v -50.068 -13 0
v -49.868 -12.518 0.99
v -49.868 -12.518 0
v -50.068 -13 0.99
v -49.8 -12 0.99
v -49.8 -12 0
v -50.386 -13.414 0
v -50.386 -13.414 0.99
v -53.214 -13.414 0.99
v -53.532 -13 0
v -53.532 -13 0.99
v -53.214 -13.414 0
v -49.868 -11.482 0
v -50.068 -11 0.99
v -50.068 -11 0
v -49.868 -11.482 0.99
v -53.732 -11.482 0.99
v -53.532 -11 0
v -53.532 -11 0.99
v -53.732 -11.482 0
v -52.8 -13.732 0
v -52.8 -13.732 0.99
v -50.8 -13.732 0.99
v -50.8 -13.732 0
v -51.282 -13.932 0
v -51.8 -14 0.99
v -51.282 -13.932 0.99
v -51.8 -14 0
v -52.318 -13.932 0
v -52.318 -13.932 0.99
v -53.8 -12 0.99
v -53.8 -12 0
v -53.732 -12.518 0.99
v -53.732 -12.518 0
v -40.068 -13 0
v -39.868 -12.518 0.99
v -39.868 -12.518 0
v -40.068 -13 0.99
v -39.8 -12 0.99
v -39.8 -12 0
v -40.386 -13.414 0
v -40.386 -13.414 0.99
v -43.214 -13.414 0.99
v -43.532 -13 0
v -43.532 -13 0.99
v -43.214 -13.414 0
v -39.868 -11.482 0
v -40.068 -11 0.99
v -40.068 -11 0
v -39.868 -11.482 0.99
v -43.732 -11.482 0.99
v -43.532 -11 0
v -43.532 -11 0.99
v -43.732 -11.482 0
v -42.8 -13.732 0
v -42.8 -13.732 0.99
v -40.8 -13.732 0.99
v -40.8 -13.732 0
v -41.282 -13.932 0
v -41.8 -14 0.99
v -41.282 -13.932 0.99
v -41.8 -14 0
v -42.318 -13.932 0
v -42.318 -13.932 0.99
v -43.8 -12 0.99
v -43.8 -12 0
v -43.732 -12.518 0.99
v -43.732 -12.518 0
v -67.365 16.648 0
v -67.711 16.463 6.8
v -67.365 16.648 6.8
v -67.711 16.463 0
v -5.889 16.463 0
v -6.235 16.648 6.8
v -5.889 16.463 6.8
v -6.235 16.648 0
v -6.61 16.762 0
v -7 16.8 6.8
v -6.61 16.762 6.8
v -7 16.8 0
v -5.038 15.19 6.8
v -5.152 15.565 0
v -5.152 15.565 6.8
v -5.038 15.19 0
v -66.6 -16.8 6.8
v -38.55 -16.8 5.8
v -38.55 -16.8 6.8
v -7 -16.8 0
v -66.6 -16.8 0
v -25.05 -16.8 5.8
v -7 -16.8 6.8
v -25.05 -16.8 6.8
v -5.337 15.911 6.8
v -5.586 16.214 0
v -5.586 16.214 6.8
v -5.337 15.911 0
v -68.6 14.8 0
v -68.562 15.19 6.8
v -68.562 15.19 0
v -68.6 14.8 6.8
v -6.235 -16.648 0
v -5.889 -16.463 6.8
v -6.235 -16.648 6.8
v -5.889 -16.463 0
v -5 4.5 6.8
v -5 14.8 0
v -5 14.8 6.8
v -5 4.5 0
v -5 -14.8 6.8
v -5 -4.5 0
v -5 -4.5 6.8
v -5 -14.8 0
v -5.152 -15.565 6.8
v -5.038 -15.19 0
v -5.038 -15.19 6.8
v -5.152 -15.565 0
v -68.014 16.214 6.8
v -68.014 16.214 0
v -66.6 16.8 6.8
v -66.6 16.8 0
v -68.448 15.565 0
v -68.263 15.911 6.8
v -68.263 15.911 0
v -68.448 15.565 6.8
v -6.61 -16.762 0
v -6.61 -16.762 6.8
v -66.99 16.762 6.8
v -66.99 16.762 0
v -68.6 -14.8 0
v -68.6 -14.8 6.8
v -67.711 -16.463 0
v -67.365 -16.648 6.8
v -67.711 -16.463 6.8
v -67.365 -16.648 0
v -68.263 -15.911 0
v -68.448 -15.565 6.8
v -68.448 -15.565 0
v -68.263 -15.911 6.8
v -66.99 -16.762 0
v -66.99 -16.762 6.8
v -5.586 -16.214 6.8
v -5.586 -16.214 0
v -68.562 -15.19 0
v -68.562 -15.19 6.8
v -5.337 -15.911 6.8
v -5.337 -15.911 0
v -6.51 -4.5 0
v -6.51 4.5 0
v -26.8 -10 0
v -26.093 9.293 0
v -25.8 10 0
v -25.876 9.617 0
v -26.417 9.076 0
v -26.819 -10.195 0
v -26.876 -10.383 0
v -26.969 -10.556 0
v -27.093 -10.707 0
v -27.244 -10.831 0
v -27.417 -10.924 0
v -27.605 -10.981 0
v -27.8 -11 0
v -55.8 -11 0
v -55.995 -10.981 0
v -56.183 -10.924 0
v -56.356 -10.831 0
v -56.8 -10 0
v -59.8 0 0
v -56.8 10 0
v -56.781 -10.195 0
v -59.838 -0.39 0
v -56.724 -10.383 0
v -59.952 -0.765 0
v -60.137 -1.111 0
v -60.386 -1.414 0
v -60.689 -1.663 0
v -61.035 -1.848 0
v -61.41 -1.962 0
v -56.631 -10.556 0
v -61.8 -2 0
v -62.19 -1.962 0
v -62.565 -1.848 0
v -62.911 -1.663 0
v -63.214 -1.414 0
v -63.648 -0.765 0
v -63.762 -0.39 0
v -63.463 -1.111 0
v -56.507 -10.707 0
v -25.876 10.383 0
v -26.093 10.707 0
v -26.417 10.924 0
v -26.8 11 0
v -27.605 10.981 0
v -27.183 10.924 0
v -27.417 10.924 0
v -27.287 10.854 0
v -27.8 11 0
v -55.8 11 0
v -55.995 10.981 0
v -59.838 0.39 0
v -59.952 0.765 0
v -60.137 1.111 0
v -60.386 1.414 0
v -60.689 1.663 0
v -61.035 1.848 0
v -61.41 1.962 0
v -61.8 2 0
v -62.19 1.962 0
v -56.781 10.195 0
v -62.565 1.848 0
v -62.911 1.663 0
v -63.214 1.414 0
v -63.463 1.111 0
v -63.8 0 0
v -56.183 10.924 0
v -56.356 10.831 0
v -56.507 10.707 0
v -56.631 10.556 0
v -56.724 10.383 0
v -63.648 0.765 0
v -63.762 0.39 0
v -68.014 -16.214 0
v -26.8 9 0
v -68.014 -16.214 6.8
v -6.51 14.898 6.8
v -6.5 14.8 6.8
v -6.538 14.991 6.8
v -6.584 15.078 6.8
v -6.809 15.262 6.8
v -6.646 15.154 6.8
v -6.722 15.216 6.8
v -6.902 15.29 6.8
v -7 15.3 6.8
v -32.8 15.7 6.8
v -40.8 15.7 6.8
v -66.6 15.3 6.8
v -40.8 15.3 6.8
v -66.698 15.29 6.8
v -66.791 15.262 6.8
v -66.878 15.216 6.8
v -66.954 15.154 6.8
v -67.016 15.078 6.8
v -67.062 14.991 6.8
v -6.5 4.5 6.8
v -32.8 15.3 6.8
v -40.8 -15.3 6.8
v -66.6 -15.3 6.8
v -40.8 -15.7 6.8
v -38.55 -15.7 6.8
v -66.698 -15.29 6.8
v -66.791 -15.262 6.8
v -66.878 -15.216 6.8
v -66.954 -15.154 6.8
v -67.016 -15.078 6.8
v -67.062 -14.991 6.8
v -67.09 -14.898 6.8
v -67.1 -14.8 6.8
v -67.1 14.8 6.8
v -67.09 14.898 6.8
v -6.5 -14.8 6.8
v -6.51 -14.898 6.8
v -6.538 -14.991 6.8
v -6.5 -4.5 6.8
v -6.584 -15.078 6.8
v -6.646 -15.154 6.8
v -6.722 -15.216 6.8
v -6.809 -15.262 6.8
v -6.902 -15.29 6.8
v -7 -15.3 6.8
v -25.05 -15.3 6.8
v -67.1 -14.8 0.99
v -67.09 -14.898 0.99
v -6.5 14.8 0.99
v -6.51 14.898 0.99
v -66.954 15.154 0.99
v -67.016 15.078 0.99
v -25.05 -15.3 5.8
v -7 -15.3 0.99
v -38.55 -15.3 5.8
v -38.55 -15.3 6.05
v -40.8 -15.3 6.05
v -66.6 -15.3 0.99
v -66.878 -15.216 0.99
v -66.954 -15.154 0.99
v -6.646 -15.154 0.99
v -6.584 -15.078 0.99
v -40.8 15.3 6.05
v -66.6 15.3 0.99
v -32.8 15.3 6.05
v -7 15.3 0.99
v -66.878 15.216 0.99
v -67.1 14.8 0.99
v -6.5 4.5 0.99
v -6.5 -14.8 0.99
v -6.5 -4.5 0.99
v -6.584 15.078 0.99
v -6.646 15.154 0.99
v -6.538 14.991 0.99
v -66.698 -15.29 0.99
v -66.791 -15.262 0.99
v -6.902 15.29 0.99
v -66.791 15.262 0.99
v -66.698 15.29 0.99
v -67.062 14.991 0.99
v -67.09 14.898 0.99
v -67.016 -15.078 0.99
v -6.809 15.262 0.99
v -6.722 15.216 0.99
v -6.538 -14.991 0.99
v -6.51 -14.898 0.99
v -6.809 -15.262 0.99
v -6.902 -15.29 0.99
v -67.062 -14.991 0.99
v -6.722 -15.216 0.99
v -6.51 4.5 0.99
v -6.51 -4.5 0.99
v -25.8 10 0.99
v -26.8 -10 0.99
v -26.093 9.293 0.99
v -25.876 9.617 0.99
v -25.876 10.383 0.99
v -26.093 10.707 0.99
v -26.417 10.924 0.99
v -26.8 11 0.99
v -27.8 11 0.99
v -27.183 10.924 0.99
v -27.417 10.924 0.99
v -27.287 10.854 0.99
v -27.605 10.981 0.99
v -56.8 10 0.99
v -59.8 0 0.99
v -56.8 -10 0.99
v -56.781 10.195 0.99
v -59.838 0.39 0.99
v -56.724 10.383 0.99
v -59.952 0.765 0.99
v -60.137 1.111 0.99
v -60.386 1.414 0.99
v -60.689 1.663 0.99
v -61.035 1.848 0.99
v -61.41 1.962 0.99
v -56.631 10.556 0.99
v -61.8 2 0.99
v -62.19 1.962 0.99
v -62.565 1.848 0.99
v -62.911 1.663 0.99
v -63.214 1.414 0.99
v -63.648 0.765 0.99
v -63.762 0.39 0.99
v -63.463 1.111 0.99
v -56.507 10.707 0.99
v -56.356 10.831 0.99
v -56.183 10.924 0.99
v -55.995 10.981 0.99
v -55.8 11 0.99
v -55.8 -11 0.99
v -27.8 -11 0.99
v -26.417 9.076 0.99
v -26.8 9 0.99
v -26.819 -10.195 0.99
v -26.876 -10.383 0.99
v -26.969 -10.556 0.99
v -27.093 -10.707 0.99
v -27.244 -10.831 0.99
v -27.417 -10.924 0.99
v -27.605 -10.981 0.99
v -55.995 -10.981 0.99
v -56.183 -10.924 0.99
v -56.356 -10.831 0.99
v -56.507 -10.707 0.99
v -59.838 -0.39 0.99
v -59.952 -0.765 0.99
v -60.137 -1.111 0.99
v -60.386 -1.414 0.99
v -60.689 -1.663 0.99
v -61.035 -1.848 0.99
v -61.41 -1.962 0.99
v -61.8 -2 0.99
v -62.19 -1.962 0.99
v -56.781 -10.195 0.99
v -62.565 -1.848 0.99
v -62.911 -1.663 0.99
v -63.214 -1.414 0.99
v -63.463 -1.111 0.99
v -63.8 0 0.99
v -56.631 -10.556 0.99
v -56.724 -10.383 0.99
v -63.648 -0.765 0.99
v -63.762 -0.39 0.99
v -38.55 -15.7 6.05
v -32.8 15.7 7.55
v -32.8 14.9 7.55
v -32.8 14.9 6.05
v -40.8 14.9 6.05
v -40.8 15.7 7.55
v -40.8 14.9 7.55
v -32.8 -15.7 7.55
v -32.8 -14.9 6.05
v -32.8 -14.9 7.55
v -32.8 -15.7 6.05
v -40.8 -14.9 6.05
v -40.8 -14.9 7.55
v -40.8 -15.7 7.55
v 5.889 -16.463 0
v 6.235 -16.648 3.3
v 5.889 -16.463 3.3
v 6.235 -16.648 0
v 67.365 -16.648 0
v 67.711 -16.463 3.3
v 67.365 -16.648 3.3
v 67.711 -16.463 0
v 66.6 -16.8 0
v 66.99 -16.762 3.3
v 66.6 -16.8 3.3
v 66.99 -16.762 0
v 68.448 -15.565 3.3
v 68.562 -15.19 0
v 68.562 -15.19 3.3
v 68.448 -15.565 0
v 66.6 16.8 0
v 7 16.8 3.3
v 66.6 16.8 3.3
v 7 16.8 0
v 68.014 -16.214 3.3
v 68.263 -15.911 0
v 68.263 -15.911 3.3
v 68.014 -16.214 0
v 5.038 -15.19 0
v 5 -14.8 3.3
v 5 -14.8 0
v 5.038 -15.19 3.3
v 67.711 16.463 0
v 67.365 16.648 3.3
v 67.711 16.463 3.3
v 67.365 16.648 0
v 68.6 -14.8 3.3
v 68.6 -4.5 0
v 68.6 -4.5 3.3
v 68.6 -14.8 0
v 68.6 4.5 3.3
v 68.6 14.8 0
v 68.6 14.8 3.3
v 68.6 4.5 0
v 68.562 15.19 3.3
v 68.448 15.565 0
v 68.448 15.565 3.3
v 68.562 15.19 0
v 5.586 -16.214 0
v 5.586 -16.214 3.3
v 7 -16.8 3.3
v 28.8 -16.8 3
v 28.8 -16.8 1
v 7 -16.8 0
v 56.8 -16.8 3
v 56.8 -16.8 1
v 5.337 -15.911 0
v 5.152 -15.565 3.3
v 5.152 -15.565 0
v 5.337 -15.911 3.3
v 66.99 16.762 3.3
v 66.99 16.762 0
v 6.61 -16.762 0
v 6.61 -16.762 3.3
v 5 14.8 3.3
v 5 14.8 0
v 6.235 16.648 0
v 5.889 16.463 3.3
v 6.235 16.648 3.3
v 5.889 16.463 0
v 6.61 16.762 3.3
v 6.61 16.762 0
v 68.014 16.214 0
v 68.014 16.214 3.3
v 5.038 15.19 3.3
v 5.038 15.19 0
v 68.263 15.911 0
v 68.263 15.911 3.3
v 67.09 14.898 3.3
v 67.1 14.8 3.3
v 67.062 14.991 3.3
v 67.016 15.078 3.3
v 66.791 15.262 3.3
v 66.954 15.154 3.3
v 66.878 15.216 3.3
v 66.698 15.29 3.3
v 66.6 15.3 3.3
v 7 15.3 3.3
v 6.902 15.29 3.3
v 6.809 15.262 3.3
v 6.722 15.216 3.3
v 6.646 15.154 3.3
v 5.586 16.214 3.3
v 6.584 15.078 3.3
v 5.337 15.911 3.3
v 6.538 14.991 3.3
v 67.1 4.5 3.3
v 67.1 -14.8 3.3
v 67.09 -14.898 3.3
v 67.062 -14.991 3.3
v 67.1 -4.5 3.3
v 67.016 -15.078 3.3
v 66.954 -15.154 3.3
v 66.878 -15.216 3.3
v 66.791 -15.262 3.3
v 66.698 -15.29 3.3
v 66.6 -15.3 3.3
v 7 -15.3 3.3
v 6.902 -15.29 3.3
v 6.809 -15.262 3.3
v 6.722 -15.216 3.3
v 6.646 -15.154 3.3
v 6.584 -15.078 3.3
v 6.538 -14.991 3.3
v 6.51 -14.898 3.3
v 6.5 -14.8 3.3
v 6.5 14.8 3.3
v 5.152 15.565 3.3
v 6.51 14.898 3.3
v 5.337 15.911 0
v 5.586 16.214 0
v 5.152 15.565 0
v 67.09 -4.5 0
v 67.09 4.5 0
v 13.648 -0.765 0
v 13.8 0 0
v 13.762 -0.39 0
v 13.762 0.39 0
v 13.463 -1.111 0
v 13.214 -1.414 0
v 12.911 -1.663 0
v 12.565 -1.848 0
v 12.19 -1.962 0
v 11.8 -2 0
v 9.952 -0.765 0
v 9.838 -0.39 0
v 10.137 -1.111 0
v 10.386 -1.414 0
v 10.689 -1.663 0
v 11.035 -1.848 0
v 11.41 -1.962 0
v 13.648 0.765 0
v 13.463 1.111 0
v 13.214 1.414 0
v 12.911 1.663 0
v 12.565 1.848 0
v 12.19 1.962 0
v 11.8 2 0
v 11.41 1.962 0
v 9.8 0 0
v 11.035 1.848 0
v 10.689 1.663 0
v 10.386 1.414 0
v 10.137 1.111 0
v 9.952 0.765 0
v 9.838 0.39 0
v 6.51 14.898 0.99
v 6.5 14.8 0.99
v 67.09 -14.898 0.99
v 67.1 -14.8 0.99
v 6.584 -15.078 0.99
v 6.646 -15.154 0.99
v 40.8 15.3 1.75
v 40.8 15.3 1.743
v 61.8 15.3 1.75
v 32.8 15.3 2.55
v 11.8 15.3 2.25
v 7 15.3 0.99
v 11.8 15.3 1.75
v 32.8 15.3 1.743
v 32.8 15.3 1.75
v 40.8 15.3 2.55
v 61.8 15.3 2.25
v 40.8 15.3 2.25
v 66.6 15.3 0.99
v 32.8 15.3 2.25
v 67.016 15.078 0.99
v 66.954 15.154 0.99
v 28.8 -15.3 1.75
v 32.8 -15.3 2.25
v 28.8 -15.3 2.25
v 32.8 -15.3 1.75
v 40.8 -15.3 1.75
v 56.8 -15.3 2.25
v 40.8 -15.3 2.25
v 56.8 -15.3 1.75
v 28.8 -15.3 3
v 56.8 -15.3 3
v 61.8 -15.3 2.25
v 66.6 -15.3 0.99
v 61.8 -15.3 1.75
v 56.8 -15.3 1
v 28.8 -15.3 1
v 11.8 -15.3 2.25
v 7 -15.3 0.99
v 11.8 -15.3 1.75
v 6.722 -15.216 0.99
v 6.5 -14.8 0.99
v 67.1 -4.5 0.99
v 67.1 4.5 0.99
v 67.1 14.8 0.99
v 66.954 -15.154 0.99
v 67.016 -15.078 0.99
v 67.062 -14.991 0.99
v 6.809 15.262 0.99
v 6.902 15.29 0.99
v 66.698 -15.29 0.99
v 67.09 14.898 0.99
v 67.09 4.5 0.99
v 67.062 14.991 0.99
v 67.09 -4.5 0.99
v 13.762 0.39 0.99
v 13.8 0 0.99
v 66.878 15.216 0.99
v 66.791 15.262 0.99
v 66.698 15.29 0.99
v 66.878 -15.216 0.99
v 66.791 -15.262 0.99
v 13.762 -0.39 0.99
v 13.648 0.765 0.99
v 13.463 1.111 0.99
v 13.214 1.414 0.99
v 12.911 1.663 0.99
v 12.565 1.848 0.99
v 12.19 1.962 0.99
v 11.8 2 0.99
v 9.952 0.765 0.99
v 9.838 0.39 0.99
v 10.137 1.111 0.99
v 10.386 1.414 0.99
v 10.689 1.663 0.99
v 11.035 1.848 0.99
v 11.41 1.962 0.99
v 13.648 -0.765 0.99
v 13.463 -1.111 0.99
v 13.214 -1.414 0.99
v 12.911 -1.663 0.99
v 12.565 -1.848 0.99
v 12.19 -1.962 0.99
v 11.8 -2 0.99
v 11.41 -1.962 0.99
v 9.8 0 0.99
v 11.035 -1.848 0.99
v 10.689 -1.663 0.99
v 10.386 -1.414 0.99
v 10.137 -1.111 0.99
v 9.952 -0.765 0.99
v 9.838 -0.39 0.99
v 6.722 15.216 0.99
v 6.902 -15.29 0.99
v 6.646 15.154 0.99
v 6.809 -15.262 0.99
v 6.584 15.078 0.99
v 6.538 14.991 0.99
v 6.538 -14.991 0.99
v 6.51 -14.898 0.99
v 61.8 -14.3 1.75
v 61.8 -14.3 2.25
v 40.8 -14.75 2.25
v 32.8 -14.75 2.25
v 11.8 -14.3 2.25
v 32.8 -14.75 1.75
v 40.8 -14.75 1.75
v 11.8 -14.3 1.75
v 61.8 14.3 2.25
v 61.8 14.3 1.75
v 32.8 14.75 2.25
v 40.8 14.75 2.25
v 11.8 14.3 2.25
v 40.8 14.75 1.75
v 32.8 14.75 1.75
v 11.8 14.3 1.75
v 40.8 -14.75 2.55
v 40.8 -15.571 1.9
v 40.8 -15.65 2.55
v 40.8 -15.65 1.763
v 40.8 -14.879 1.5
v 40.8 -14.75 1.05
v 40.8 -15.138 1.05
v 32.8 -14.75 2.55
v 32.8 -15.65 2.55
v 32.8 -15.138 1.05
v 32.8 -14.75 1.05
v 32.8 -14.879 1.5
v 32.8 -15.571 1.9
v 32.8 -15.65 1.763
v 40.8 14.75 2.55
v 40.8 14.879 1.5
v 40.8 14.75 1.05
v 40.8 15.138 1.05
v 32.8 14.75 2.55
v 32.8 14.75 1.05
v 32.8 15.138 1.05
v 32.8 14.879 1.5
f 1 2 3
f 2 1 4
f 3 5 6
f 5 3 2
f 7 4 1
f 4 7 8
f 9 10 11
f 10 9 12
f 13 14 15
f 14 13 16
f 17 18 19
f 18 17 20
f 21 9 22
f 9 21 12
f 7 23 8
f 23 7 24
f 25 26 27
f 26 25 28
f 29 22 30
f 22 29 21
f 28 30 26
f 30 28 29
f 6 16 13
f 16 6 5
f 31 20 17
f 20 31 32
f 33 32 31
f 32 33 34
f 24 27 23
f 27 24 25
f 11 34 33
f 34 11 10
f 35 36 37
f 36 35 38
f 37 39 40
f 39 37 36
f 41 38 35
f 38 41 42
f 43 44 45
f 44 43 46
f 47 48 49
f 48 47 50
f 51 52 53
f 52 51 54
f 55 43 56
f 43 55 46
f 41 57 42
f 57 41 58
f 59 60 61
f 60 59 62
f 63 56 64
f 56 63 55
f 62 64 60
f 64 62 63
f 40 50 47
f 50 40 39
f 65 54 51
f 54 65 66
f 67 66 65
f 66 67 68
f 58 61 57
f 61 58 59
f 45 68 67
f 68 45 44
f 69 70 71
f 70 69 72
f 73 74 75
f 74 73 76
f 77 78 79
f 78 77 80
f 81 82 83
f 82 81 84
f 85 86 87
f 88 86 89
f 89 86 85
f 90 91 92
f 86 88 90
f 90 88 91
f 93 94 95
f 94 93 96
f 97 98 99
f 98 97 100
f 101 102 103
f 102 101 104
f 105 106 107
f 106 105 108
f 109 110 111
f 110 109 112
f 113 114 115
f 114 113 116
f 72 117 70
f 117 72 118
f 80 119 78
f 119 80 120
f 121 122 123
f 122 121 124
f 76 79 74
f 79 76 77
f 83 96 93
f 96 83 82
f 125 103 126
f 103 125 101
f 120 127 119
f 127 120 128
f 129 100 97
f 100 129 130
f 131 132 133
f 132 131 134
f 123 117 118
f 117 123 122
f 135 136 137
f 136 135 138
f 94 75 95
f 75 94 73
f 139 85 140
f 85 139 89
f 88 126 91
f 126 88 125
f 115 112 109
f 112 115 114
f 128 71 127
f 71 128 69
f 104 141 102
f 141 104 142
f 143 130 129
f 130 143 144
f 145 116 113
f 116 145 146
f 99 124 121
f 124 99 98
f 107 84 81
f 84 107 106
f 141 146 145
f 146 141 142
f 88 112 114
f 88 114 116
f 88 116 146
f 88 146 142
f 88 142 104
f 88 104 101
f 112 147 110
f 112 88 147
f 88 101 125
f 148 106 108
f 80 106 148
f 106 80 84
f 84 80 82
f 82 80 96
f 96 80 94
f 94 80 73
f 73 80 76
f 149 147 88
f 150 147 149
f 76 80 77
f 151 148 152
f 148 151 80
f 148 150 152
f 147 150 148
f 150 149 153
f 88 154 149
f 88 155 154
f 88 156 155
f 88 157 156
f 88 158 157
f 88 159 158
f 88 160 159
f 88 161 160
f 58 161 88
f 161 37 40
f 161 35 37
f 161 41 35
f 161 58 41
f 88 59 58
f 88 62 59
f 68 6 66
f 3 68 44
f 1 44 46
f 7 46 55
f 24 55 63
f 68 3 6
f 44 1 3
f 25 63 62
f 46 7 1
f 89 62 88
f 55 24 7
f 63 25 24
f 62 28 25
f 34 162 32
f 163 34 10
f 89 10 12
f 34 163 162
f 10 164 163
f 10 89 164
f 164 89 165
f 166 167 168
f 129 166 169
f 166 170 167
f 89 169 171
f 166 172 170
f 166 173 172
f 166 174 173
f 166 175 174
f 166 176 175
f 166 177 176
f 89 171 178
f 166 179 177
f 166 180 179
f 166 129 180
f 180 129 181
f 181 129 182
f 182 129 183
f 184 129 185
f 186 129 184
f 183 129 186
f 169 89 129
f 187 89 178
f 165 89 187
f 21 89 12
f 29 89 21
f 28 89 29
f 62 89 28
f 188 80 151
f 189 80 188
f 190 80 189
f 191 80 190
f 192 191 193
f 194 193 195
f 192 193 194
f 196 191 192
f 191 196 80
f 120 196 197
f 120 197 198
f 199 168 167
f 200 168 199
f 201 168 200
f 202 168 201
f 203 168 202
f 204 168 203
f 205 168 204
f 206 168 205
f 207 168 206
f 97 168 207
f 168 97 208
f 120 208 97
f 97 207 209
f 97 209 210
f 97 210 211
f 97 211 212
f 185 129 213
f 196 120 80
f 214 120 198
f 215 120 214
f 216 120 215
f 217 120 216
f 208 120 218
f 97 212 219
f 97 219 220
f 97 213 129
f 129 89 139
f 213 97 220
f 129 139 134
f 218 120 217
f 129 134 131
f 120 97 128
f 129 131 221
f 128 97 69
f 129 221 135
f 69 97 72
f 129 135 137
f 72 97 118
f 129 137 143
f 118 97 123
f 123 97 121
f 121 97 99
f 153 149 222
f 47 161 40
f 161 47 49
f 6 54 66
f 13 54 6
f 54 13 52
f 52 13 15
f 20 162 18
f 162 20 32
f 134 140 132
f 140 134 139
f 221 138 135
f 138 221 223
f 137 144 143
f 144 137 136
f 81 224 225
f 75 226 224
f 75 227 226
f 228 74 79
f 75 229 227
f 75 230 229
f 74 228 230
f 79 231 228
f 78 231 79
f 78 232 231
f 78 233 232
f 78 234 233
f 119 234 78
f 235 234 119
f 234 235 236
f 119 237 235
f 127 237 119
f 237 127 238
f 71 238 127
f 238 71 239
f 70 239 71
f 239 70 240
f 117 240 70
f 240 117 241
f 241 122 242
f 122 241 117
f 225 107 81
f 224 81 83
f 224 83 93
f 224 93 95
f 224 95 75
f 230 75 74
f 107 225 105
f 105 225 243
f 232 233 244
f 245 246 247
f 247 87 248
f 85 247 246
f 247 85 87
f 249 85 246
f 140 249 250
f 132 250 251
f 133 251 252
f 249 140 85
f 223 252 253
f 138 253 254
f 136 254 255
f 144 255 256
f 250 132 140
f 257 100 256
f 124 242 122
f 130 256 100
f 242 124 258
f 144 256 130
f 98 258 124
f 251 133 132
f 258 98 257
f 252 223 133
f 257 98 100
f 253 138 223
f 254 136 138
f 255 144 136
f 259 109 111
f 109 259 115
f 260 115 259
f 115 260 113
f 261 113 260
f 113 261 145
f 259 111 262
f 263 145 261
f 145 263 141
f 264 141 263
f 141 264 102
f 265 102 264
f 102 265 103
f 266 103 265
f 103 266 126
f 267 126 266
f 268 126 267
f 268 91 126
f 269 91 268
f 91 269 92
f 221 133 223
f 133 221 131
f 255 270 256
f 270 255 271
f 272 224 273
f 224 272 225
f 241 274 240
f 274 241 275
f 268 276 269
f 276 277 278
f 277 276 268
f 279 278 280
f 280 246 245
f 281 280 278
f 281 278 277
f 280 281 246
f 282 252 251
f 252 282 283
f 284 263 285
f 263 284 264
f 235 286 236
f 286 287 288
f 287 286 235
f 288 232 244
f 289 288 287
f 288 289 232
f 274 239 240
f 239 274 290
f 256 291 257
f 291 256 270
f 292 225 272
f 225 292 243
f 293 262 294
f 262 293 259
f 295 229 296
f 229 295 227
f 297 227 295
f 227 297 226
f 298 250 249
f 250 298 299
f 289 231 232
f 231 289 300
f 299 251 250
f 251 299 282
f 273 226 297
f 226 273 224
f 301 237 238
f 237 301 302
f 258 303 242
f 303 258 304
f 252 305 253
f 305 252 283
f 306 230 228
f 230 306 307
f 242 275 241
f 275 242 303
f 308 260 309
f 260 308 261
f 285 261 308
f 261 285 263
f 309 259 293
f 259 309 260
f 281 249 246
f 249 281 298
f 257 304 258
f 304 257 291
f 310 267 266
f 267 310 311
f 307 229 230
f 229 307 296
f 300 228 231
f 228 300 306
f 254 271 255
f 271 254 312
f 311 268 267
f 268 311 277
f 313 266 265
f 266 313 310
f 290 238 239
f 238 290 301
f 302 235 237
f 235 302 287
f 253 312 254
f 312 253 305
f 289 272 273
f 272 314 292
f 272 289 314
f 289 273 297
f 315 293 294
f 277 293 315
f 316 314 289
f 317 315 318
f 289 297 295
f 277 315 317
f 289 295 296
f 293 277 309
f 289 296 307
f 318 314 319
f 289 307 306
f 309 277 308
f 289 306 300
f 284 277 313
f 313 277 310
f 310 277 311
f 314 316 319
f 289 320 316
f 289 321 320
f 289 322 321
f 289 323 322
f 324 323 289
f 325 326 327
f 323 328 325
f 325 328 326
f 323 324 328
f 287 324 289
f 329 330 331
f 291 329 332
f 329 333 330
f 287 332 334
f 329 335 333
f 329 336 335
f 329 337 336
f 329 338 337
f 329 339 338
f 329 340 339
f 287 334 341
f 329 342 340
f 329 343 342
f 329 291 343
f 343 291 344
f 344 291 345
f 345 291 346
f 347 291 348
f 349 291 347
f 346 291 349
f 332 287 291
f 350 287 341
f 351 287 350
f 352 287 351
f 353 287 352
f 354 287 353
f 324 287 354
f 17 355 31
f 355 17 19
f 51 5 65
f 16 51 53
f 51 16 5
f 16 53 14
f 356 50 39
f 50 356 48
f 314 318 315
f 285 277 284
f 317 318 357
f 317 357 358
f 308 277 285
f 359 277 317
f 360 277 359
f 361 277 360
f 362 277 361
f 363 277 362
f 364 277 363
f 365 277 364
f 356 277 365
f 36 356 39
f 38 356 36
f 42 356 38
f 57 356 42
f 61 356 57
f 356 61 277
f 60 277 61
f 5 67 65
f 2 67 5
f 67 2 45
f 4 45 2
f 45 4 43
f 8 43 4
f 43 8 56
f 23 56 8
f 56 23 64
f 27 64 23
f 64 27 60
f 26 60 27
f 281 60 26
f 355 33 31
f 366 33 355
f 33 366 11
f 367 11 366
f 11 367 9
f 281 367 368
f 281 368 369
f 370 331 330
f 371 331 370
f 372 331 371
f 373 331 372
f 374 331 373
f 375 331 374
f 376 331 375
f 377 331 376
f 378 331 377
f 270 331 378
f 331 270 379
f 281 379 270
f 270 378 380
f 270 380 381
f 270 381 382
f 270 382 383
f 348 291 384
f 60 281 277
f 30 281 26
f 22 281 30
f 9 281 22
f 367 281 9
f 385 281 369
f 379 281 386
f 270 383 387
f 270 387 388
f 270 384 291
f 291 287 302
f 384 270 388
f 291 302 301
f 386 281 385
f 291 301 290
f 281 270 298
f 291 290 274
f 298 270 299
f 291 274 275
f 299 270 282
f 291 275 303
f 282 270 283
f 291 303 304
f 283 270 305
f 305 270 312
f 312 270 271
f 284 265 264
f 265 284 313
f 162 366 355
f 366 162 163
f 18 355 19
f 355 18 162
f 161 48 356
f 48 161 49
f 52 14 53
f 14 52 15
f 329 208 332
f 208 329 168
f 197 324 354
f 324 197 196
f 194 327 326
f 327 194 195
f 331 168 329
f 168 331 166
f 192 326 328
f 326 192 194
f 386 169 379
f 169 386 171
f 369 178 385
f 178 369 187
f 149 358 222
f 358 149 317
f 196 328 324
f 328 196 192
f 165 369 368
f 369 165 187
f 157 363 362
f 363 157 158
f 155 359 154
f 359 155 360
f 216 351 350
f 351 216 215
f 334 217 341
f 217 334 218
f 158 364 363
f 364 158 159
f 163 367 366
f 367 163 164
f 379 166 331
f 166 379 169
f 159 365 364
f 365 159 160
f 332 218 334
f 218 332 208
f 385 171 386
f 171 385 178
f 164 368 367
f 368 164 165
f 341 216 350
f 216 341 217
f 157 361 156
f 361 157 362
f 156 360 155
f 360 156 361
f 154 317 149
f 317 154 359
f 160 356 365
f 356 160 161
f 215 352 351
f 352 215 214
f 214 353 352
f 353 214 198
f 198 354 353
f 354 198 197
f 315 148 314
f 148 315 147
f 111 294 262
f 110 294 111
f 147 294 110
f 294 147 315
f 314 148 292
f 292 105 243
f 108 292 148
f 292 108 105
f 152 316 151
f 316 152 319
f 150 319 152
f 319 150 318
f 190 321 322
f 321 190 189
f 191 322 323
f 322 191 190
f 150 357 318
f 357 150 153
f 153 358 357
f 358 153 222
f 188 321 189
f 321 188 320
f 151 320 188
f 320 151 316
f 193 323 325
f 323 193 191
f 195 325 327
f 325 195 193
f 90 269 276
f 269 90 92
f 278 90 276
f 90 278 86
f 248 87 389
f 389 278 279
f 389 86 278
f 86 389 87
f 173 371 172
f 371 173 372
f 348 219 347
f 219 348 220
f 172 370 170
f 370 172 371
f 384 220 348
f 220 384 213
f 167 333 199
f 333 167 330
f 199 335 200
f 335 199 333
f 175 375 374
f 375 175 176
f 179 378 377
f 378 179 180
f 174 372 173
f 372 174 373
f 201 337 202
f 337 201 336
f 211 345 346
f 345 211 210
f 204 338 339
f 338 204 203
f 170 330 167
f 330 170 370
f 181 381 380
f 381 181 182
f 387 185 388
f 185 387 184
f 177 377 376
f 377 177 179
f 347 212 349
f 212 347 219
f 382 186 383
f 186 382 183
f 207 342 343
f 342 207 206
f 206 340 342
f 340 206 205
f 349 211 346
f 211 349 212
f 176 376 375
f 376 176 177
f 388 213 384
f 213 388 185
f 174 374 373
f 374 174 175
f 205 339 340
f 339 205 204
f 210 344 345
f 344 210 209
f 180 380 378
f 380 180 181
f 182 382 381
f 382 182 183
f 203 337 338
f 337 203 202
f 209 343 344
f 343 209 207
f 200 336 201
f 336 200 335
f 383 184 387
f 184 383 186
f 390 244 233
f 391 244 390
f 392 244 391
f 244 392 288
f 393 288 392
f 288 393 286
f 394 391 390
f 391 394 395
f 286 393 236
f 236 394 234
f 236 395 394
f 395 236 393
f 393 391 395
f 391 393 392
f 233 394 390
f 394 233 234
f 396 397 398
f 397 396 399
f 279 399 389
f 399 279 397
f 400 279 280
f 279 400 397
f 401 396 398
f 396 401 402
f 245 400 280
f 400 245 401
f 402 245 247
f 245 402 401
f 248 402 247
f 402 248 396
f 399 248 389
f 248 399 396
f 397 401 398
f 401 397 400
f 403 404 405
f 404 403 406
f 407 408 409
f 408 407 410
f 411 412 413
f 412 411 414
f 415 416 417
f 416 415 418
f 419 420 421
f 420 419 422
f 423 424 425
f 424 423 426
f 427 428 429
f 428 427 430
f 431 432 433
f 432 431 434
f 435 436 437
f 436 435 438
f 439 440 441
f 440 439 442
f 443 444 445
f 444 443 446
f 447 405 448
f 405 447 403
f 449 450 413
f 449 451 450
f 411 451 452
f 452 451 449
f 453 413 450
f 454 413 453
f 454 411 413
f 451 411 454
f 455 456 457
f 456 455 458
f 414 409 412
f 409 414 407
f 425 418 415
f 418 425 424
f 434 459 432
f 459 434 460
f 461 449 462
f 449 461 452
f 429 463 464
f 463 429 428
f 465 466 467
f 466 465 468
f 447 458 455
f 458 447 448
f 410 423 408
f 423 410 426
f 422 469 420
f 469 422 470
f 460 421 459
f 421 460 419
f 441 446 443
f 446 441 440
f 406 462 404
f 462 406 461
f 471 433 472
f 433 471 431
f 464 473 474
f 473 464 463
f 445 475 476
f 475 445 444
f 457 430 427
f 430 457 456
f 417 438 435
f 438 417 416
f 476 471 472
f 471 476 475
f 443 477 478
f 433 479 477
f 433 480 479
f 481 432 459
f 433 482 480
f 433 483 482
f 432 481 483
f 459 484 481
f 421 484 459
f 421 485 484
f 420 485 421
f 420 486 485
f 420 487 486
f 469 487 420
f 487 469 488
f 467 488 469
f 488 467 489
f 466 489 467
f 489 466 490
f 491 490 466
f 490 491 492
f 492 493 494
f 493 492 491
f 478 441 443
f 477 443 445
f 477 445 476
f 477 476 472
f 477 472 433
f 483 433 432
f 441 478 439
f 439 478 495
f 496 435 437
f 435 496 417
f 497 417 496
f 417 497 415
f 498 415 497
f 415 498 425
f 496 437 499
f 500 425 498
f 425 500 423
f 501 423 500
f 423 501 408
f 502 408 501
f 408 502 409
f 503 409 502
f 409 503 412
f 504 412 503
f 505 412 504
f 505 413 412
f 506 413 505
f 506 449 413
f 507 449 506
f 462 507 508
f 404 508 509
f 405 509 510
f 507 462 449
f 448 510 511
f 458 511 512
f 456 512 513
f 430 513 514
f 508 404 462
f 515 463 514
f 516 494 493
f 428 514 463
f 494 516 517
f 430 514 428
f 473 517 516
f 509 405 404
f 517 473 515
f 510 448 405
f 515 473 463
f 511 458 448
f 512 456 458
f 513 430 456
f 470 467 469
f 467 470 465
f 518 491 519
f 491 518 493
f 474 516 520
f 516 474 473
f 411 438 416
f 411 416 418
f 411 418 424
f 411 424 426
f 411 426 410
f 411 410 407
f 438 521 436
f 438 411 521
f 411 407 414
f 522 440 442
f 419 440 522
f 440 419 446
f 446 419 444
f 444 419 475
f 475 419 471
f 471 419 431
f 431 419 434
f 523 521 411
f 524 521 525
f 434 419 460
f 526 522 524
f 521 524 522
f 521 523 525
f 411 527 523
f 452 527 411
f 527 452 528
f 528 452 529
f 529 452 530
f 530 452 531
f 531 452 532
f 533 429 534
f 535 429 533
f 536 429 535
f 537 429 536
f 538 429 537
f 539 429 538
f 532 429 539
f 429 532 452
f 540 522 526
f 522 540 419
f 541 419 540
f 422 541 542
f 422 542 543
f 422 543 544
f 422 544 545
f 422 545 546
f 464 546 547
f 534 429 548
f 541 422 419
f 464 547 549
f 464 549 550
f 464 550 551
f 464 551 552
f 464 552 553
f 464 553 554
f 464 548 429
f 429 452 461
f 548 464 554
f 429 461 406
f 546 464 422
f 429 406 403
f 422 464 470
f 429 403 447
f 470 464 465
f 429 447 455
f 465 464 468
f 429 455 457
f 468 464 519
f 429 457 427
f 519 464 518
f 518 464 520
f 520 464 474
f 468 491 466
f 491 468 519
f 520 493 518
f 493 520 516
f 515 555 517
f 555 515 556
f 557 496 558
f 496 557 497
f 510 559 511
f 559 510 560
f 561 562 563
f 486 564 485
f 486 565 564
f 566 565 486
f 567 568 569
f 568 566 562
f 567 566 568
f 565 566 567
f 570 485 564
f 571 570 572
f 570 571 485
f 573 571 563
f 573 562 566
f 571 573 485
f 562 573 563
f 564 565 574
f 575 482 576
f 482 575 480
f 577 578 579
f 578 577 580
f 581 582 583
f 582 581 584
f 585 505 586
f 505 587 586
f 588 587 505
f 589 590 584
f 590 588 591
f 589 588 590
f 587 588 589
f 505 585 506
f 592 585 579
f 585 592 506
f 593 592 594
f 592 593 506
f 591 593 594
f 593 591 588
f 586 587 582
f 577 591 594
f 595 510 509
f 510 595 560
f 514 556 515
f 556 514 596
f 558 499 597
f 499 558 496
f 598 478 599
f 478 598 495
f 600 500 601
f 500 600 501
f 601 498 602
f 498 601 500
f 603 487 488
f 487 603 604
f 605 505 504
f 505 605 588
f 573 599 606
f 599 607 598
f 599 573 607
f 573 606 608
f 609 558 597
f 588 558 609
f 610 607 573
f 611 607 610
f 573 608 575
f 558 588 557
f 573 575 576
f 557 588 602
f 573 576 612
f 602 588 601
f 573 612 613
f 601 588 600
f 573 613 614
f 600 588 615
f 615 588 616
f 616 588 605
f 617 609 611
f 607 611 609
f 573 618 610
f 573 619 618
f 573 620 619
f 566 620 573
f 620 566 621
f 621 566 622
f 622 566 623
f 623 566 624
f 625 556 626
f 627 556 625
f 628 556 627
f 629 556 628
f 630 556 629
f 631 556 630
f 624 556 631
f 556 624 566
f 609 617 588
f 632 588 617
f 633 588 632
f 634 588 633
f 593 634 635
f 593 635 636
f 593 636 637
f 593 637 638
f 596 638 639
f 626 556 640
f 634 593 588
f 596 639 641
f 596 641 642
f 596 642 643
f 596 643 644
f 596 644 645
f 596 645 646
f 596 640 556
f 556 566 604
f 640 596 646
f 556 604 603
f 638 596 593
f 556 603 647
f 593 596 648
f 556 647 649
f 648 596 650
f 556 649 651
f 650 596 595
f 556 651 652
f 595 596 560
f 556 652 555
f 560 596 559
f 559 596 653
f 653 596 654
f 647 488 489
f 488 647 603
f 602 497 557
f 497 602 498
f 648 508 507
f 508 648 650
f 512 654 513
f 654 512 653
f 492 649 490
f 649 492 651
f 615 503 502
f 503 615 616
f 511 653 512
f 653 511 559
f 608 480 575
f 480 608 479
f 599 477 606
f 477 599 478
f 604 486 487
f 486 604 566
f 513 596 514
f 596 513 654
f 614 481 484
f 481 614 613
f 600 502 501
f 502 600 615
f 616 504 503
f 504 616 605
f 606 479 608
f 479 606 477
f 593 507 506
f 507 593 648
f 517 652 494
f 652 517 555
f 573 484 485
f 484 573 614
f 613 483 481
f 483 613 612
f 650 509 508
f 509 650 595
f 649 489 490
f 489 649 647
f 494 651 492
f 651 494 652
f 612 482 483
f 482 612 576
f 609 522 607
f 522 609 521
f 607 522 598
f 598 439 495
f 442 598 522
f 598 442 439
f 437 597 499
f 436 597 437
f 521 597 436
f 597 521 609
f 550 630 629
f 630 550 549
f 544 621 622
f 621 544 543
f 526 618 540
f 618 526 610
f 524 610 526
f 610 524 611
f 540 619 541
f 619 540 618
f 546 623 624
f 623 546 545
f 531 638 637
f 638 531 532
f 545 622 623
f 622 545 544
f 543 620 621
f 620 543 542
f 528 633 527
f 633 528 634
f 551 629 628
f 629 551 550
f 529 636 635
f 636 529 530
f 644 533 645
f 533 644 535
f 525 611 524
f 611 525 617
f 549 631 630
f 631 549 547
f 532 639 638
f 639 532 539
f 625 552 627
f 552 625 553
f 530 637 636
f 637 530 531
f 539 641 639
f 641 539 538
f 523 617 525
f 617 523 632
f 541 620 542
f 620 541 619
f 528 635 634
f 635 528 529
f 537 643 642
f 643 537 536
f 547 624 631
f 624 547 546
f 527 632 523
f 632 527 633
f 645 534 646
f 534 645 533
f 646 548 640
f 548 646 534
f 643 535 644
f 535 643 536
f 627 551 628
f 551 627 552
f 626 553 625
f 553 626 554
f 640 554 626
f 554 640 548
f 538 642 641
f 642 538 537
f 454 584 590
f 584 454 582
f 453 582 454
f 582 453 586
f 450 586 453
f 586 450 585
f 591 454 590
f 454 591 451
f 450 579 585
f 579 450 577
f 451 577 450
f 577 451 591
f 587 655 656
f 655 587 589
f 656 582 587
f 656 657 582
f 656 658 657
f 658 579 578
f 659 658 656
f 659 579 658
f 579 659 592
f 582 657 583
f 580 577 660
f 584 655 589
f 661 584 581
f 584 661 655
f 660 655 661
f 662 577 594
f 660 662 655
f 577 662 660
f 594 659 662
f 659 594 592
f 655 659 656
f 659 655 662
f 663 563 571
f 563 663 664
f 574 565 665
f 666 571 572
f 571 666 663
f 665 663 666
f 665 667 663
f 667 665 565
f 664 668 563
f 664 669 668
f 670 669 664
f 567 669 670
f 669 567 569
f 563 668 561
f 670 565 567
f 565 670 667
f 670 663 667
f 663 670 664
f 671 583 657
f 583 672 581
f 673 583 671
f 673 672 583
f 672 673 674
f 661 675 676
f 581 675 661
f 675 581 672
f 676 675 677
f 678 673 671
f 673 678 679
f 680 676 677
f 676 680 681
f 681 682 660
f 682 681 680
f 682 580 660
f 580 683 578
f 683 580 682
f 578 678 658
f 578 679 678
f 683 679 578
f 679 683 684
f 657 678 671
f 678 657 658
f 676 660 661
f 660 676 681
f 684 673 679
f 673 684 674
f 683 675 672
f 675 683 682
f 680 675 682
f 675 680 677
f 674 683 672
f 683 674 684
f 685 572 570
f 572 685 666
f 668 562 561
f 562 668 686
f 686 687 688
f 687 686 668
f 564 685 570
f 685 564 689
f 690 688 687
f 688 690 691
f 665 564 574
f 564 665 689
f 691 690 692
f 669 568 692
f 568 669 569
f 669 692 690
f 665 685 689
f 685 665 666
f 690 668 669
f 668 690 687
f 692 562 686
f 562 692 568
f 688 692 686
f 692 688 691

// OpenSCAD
// ============================================================
// Briolette Credstick Rev1 — 3D Printable Enclosure
// ============================================================
// Target: FDM printing (PLA/PETG), 0.2mm layer height
// Two-piece snap-fit: top shell + bottom shell
// PCB: 60mm x 30mm, 1.6mm thick, 4-layer
//
// Print settings:
//   Material: PETG recommended (impact resistance, slight flex)
//   Layer height: 0.2mm
//   Infill: 20-30%
//   Supports: minimal (overhang-free design)
//   Walls: 2 perimeters minimum
// ============================================================

// ---- Parameters (edit these to tune fit) ----

// PCB dimensions
pcb_length = 60.0;       // X axis
pcb_width  = 30.0;       // Y axis
pcb_thick  = 1.6;        // PCB thickness

// Component clearances (above PCB top face)
comp_clearance_top = 5.0; // tallest top-side component (supercaps ~14mm dia, mounted standing)
comp_clearance_bot = 1.5; // bottom-side clearance (NFC antenna trace, no components)

// Wall thickness
wall = 1.5;               // side walls
floor_thick = 1.0;        // bottom shell floor
roof_thick  = 1.0;        // top shell roof

// Tolerances
pcb_tol = 0.3;            // gap around PCB edges (per side)
snap_tol = 0.1;           // snap-fit interference

// Corner radius (matches PCB outline)
corner_r = 2.0;

// Case outer dimensions (derived)
case_length = pcb_length + 2 * (wall + pcb_tol);
case_width  = pcb_width  + 2 * (wall + pcb_tol);
case_height_top = roof_thick + comp_clearance_top + pcb_thick / 2;
case_height_bot = floor_thick + comp_clearance_bot + pcb_thick / 2;
case_height = case_height_top + case_height_bot;

// Split plane: Z=0 at PCB midplane
split_z = 0;

// ---- Cutout dimensions ----

// USB-C connector: right end, centered
usbc_width  = 9.0;       // connector opening width
usbc_height = 3.5;       // connector opening height
usbc_offset_z = 0;       // center relative to PCB midplane

// E-ink display window: upper-left area of top shell
// GDEY0154D67: 1.54" = ~37.3mm diagonal, active area ~27.6x27.6mm
display_length = 30.0;   // window X
display_width  = 22.0;   // window Y
display_offset_x = -5.0; // shift left from center (display area)
display_offset_y = 0.0;  // centered in Y

// Buttons: two tactile switches, accessible through top shell
btn_dia = 4.0;           // button hole diameter
btn1_x = -15.0;          // left button X (from center)
btn2_x = -5.0;           // right button X
btn_y  = 12.0;           // Y offset (below center, near bottom edge)

// Keyring hole: left end, 3.2mm through-hole
keyring_dia = 4.0;       // hole through case (slightly larger than PCB hole)
keyring_x = -pcb_length / 2 + 5.0;

// LED window: small hole for charge status LED
led_dia = 2.0;
led_x = 10.0;            // approximate LED position
led_y = -10.0;

// SIM card slot: side opening for nano-SIM push-push insertion/ejection
// Nano-SIM (4FF): 12.3mm x 8.8mm x 0.67mm
// Connector: Molex 78800-0001, 1.25mm low-profile, push-push
sim_slot_width  = 13.5;  // card + connector clearance
sim_slot_height = 2.0;   // connector height + card + clearance
sim_slot_x = 5.0;        // offset from center (near USB-C end)
sim_slot_side = 1;       // 1 = right side wall, -1 = left

// Piezo slot: side opening for cantilever vibration
piezo_slot_length = 28.0;
piezo_slot_width  = 2.0;
piezo_slot_x = -8.0;     // centered on piezo area

// ---- Snap-fit tab dimensions ----
snap_tab_length = 8.0;
snap_tab_height = 1.5;
snap_tab_depth  = 0.8;

// ============================================================
// Utility modules
// ============================================================

module rounded_box(size, r) {
    // Rounded-corner box (XY plane corners rounded, Z axis straight)
    hull() {
        for (x = [-size[0]/2 + r, size[0]/2 - r])
            for (y = [-size[1]/2 + r, size[1]/2 - r])
                translate([x, y, 0])
                    cylinder(h = size[2], r = r, $fn = 32);
    }
}

module rounded_box_centered(size, r) {
    translate([0, 0, -size[2]/2])
        rounded_box(size, r);
}

// ============================================================
// Top Shell (display side, buttons, USB-C top half)
// ============================================================
module top_shell() {
    difference() {
        // Outer shell
        translate([0, 0, split_z])
            rounded_box([case_length, case_width, case_height_top], corner_r);

        // Inner cavity (hollow out)
        translate([0, 0, split_z - 0.01])
            rounded_box([
                case_length - 2 * wall,
                case_width  - 2 * wall,
                case_height_top - roof_thick + 0.02
            ], corner_r - wall);

        // Display window (rectangular cutout through roof)
        translate([display_offset_x, display_offset_y,
                   split_z + case_height_top - roof_thick - 0.01])
            rounded_box([display_length, display_width, roof_thick + 0.02], 1.0);

        // Button holes (through roof)
        for (bx = [btn1_x, btn2_x])
            translate([bx, btn_y, split_z + case_height_top - roof_thick - 0.01])
                cylinder(h = roof_thick + 0.02, d = btn_dia, $fn = 24);

        // USB-C cutout (right end wall, top half)
        translate([case_length / 2 - wall - 0.01,
                   -usbc_width / 2,
                   split_z + usbc_offset_z - usbc_height / 2])
            cube([wall + 0.02, usbc_width, usbc_height / 2 + case_height_top]);

        // LED window (small hole through roof)
        translate([led_x, led_y, split_z + case_height_top - roof_thick - 0.01])
            cylinder(h = roof_thick + 0.02, d = led_dia, $fn = 16);

        // SIM card slot (side wall opening for card insertion/ejection)
        // Push-push connector: card sits flush, push to eject
        translate([sim_slot_x - sim_slot_width / 2,
                   sim_slot_side * (case_width / 2 - wall - 0.01),
                   split_z + usbc_offset_z - sim_slot_height / 2])
            cube([sim_slot_width, wall + 0.02, sim_slot_height]);

        // Keyring hole (through left end wall + extends into shell)
        translate([keyring_x, 0, split_z - 1])
            cylinder(h = case_height_top + 2, d = keyring_dia, $fn = 32);
    }

    // Snap-fit receptacle ridges (inside walls, for bottom shell tabs)
    // Left and right side walls
    for (sign = [-1, 1])
        translate([0, sign * (case_width / 2 - wall), split_z])
            cube([snap_tab_length, snap_tab_depth, snap_tab_height], center = true);
}

// ============================================================
// Bottom Shell (NFC antenna side, flat)
// ============================================================
module bottom_shell() {
    difference() {
        // Outer shell
        translate([0, 0, split_z - case_height_bot])
            rounded_box([case_length, case_width, case_height_bot], corner_r);

        // Inner cavity
        translate([0, 0, split_z - case_height_bot + floor_thick - 0.01])
            rounded_box([
                case_length - 2 * wall,
                case_width  - 2 * wall,
                case_height_bot - floor_thick + 0.02
            ], corner_r - wall);

        // USB-C cutout (right end wall, bottom half)
        translate([case_length / 2 - wall - 0.01,
                   -usbc_width / 2,
                   split_z - case_height_bot - 0.01])
            cube([wall + 0.02, usbc_width,
                  case_height_bot + usbc_offset_z + usbc_height / 2 + 0.01]);

        // Keyring hole
        translate([keyring_x, 0, split_z - case_height_bot - 1])
            cylinder(h = case_height_bot + 2, d = keyring_dia, $fn = 32);

        // Piezo slot (side wall ventilation for cantilever movement)
        translate([piezo_slot_x, -case_width / 2 - 0.01,
                   split_z - case_height_bot + floor_thick])
            cube([piezo_slot_length, wall + 0.02, piezo_slot_width]);
    }

    // PCB support ledges (internal shelves the PCB rests on)
    for (sign = [-1, 1])
        translate([0, sign * (pcb_width / 2 + pcb_tol - 0.5),
                   split_z - pcb_thick / 2 - 0.5])
            cube([pcb_length - 10, 1.0, 0.5], center = true);

    // Snap-fit tabs (hook onto top shell ridges)
    for (sign = [-1, 1])
        translate([0, sign * (case_width / 2 - wall - snap_tol),
                   split_z - snap_tab_height])
            difference() {
                cube([snap_tab_length, snap_tab_depth + snap_tol,
                      snap_tab_height], center = true);
                // Chamfer for easy insertion
                translate([0, sign * snap_tab_depth / 2, -snap_tab_height / 2])
                    rotate([sign * 30, 0, 0])
                        cube([snap_tab_length + 0.1, snap_tab_depth, snap_tab_height],
                             center = true);
            }
}

// ============================================================
// PCB mockup (for visualization, not printed)
// ============================================================
module pcb_mockup() {
    color("green", 0.5)
        translate([0, 0, -pcb_thick / 2])
            rounded_box([pcb_length, pcb_width, pcb_thick], corner_r);
}

// ============================================================
// Assembly / rendering
// ============================================================

// Uncomment ONE of the following to render/export:

// -- Full assembly (for visualization) --
// pcb_mockup();
// color("DarkSlateGray", 0.8) top_shell();
// color("DarkSlateGray", 0.6) bottom_shell();

// -- Top shell only (for STL export) --
// top_shell();

// -- Bottom shell only (for STL export) --
// bottom_shell();

// -- Print layout: both shells side by side, flat on build plate --
translate([-case_length / 2 - 5, 0, case_height_top])
    rotate([180, 0, 0])
        top_shell();

translate([case_length / 2 + 5, 0, case_height_bot])
    rotate([0, 0, 0])
        bottom_shell();
